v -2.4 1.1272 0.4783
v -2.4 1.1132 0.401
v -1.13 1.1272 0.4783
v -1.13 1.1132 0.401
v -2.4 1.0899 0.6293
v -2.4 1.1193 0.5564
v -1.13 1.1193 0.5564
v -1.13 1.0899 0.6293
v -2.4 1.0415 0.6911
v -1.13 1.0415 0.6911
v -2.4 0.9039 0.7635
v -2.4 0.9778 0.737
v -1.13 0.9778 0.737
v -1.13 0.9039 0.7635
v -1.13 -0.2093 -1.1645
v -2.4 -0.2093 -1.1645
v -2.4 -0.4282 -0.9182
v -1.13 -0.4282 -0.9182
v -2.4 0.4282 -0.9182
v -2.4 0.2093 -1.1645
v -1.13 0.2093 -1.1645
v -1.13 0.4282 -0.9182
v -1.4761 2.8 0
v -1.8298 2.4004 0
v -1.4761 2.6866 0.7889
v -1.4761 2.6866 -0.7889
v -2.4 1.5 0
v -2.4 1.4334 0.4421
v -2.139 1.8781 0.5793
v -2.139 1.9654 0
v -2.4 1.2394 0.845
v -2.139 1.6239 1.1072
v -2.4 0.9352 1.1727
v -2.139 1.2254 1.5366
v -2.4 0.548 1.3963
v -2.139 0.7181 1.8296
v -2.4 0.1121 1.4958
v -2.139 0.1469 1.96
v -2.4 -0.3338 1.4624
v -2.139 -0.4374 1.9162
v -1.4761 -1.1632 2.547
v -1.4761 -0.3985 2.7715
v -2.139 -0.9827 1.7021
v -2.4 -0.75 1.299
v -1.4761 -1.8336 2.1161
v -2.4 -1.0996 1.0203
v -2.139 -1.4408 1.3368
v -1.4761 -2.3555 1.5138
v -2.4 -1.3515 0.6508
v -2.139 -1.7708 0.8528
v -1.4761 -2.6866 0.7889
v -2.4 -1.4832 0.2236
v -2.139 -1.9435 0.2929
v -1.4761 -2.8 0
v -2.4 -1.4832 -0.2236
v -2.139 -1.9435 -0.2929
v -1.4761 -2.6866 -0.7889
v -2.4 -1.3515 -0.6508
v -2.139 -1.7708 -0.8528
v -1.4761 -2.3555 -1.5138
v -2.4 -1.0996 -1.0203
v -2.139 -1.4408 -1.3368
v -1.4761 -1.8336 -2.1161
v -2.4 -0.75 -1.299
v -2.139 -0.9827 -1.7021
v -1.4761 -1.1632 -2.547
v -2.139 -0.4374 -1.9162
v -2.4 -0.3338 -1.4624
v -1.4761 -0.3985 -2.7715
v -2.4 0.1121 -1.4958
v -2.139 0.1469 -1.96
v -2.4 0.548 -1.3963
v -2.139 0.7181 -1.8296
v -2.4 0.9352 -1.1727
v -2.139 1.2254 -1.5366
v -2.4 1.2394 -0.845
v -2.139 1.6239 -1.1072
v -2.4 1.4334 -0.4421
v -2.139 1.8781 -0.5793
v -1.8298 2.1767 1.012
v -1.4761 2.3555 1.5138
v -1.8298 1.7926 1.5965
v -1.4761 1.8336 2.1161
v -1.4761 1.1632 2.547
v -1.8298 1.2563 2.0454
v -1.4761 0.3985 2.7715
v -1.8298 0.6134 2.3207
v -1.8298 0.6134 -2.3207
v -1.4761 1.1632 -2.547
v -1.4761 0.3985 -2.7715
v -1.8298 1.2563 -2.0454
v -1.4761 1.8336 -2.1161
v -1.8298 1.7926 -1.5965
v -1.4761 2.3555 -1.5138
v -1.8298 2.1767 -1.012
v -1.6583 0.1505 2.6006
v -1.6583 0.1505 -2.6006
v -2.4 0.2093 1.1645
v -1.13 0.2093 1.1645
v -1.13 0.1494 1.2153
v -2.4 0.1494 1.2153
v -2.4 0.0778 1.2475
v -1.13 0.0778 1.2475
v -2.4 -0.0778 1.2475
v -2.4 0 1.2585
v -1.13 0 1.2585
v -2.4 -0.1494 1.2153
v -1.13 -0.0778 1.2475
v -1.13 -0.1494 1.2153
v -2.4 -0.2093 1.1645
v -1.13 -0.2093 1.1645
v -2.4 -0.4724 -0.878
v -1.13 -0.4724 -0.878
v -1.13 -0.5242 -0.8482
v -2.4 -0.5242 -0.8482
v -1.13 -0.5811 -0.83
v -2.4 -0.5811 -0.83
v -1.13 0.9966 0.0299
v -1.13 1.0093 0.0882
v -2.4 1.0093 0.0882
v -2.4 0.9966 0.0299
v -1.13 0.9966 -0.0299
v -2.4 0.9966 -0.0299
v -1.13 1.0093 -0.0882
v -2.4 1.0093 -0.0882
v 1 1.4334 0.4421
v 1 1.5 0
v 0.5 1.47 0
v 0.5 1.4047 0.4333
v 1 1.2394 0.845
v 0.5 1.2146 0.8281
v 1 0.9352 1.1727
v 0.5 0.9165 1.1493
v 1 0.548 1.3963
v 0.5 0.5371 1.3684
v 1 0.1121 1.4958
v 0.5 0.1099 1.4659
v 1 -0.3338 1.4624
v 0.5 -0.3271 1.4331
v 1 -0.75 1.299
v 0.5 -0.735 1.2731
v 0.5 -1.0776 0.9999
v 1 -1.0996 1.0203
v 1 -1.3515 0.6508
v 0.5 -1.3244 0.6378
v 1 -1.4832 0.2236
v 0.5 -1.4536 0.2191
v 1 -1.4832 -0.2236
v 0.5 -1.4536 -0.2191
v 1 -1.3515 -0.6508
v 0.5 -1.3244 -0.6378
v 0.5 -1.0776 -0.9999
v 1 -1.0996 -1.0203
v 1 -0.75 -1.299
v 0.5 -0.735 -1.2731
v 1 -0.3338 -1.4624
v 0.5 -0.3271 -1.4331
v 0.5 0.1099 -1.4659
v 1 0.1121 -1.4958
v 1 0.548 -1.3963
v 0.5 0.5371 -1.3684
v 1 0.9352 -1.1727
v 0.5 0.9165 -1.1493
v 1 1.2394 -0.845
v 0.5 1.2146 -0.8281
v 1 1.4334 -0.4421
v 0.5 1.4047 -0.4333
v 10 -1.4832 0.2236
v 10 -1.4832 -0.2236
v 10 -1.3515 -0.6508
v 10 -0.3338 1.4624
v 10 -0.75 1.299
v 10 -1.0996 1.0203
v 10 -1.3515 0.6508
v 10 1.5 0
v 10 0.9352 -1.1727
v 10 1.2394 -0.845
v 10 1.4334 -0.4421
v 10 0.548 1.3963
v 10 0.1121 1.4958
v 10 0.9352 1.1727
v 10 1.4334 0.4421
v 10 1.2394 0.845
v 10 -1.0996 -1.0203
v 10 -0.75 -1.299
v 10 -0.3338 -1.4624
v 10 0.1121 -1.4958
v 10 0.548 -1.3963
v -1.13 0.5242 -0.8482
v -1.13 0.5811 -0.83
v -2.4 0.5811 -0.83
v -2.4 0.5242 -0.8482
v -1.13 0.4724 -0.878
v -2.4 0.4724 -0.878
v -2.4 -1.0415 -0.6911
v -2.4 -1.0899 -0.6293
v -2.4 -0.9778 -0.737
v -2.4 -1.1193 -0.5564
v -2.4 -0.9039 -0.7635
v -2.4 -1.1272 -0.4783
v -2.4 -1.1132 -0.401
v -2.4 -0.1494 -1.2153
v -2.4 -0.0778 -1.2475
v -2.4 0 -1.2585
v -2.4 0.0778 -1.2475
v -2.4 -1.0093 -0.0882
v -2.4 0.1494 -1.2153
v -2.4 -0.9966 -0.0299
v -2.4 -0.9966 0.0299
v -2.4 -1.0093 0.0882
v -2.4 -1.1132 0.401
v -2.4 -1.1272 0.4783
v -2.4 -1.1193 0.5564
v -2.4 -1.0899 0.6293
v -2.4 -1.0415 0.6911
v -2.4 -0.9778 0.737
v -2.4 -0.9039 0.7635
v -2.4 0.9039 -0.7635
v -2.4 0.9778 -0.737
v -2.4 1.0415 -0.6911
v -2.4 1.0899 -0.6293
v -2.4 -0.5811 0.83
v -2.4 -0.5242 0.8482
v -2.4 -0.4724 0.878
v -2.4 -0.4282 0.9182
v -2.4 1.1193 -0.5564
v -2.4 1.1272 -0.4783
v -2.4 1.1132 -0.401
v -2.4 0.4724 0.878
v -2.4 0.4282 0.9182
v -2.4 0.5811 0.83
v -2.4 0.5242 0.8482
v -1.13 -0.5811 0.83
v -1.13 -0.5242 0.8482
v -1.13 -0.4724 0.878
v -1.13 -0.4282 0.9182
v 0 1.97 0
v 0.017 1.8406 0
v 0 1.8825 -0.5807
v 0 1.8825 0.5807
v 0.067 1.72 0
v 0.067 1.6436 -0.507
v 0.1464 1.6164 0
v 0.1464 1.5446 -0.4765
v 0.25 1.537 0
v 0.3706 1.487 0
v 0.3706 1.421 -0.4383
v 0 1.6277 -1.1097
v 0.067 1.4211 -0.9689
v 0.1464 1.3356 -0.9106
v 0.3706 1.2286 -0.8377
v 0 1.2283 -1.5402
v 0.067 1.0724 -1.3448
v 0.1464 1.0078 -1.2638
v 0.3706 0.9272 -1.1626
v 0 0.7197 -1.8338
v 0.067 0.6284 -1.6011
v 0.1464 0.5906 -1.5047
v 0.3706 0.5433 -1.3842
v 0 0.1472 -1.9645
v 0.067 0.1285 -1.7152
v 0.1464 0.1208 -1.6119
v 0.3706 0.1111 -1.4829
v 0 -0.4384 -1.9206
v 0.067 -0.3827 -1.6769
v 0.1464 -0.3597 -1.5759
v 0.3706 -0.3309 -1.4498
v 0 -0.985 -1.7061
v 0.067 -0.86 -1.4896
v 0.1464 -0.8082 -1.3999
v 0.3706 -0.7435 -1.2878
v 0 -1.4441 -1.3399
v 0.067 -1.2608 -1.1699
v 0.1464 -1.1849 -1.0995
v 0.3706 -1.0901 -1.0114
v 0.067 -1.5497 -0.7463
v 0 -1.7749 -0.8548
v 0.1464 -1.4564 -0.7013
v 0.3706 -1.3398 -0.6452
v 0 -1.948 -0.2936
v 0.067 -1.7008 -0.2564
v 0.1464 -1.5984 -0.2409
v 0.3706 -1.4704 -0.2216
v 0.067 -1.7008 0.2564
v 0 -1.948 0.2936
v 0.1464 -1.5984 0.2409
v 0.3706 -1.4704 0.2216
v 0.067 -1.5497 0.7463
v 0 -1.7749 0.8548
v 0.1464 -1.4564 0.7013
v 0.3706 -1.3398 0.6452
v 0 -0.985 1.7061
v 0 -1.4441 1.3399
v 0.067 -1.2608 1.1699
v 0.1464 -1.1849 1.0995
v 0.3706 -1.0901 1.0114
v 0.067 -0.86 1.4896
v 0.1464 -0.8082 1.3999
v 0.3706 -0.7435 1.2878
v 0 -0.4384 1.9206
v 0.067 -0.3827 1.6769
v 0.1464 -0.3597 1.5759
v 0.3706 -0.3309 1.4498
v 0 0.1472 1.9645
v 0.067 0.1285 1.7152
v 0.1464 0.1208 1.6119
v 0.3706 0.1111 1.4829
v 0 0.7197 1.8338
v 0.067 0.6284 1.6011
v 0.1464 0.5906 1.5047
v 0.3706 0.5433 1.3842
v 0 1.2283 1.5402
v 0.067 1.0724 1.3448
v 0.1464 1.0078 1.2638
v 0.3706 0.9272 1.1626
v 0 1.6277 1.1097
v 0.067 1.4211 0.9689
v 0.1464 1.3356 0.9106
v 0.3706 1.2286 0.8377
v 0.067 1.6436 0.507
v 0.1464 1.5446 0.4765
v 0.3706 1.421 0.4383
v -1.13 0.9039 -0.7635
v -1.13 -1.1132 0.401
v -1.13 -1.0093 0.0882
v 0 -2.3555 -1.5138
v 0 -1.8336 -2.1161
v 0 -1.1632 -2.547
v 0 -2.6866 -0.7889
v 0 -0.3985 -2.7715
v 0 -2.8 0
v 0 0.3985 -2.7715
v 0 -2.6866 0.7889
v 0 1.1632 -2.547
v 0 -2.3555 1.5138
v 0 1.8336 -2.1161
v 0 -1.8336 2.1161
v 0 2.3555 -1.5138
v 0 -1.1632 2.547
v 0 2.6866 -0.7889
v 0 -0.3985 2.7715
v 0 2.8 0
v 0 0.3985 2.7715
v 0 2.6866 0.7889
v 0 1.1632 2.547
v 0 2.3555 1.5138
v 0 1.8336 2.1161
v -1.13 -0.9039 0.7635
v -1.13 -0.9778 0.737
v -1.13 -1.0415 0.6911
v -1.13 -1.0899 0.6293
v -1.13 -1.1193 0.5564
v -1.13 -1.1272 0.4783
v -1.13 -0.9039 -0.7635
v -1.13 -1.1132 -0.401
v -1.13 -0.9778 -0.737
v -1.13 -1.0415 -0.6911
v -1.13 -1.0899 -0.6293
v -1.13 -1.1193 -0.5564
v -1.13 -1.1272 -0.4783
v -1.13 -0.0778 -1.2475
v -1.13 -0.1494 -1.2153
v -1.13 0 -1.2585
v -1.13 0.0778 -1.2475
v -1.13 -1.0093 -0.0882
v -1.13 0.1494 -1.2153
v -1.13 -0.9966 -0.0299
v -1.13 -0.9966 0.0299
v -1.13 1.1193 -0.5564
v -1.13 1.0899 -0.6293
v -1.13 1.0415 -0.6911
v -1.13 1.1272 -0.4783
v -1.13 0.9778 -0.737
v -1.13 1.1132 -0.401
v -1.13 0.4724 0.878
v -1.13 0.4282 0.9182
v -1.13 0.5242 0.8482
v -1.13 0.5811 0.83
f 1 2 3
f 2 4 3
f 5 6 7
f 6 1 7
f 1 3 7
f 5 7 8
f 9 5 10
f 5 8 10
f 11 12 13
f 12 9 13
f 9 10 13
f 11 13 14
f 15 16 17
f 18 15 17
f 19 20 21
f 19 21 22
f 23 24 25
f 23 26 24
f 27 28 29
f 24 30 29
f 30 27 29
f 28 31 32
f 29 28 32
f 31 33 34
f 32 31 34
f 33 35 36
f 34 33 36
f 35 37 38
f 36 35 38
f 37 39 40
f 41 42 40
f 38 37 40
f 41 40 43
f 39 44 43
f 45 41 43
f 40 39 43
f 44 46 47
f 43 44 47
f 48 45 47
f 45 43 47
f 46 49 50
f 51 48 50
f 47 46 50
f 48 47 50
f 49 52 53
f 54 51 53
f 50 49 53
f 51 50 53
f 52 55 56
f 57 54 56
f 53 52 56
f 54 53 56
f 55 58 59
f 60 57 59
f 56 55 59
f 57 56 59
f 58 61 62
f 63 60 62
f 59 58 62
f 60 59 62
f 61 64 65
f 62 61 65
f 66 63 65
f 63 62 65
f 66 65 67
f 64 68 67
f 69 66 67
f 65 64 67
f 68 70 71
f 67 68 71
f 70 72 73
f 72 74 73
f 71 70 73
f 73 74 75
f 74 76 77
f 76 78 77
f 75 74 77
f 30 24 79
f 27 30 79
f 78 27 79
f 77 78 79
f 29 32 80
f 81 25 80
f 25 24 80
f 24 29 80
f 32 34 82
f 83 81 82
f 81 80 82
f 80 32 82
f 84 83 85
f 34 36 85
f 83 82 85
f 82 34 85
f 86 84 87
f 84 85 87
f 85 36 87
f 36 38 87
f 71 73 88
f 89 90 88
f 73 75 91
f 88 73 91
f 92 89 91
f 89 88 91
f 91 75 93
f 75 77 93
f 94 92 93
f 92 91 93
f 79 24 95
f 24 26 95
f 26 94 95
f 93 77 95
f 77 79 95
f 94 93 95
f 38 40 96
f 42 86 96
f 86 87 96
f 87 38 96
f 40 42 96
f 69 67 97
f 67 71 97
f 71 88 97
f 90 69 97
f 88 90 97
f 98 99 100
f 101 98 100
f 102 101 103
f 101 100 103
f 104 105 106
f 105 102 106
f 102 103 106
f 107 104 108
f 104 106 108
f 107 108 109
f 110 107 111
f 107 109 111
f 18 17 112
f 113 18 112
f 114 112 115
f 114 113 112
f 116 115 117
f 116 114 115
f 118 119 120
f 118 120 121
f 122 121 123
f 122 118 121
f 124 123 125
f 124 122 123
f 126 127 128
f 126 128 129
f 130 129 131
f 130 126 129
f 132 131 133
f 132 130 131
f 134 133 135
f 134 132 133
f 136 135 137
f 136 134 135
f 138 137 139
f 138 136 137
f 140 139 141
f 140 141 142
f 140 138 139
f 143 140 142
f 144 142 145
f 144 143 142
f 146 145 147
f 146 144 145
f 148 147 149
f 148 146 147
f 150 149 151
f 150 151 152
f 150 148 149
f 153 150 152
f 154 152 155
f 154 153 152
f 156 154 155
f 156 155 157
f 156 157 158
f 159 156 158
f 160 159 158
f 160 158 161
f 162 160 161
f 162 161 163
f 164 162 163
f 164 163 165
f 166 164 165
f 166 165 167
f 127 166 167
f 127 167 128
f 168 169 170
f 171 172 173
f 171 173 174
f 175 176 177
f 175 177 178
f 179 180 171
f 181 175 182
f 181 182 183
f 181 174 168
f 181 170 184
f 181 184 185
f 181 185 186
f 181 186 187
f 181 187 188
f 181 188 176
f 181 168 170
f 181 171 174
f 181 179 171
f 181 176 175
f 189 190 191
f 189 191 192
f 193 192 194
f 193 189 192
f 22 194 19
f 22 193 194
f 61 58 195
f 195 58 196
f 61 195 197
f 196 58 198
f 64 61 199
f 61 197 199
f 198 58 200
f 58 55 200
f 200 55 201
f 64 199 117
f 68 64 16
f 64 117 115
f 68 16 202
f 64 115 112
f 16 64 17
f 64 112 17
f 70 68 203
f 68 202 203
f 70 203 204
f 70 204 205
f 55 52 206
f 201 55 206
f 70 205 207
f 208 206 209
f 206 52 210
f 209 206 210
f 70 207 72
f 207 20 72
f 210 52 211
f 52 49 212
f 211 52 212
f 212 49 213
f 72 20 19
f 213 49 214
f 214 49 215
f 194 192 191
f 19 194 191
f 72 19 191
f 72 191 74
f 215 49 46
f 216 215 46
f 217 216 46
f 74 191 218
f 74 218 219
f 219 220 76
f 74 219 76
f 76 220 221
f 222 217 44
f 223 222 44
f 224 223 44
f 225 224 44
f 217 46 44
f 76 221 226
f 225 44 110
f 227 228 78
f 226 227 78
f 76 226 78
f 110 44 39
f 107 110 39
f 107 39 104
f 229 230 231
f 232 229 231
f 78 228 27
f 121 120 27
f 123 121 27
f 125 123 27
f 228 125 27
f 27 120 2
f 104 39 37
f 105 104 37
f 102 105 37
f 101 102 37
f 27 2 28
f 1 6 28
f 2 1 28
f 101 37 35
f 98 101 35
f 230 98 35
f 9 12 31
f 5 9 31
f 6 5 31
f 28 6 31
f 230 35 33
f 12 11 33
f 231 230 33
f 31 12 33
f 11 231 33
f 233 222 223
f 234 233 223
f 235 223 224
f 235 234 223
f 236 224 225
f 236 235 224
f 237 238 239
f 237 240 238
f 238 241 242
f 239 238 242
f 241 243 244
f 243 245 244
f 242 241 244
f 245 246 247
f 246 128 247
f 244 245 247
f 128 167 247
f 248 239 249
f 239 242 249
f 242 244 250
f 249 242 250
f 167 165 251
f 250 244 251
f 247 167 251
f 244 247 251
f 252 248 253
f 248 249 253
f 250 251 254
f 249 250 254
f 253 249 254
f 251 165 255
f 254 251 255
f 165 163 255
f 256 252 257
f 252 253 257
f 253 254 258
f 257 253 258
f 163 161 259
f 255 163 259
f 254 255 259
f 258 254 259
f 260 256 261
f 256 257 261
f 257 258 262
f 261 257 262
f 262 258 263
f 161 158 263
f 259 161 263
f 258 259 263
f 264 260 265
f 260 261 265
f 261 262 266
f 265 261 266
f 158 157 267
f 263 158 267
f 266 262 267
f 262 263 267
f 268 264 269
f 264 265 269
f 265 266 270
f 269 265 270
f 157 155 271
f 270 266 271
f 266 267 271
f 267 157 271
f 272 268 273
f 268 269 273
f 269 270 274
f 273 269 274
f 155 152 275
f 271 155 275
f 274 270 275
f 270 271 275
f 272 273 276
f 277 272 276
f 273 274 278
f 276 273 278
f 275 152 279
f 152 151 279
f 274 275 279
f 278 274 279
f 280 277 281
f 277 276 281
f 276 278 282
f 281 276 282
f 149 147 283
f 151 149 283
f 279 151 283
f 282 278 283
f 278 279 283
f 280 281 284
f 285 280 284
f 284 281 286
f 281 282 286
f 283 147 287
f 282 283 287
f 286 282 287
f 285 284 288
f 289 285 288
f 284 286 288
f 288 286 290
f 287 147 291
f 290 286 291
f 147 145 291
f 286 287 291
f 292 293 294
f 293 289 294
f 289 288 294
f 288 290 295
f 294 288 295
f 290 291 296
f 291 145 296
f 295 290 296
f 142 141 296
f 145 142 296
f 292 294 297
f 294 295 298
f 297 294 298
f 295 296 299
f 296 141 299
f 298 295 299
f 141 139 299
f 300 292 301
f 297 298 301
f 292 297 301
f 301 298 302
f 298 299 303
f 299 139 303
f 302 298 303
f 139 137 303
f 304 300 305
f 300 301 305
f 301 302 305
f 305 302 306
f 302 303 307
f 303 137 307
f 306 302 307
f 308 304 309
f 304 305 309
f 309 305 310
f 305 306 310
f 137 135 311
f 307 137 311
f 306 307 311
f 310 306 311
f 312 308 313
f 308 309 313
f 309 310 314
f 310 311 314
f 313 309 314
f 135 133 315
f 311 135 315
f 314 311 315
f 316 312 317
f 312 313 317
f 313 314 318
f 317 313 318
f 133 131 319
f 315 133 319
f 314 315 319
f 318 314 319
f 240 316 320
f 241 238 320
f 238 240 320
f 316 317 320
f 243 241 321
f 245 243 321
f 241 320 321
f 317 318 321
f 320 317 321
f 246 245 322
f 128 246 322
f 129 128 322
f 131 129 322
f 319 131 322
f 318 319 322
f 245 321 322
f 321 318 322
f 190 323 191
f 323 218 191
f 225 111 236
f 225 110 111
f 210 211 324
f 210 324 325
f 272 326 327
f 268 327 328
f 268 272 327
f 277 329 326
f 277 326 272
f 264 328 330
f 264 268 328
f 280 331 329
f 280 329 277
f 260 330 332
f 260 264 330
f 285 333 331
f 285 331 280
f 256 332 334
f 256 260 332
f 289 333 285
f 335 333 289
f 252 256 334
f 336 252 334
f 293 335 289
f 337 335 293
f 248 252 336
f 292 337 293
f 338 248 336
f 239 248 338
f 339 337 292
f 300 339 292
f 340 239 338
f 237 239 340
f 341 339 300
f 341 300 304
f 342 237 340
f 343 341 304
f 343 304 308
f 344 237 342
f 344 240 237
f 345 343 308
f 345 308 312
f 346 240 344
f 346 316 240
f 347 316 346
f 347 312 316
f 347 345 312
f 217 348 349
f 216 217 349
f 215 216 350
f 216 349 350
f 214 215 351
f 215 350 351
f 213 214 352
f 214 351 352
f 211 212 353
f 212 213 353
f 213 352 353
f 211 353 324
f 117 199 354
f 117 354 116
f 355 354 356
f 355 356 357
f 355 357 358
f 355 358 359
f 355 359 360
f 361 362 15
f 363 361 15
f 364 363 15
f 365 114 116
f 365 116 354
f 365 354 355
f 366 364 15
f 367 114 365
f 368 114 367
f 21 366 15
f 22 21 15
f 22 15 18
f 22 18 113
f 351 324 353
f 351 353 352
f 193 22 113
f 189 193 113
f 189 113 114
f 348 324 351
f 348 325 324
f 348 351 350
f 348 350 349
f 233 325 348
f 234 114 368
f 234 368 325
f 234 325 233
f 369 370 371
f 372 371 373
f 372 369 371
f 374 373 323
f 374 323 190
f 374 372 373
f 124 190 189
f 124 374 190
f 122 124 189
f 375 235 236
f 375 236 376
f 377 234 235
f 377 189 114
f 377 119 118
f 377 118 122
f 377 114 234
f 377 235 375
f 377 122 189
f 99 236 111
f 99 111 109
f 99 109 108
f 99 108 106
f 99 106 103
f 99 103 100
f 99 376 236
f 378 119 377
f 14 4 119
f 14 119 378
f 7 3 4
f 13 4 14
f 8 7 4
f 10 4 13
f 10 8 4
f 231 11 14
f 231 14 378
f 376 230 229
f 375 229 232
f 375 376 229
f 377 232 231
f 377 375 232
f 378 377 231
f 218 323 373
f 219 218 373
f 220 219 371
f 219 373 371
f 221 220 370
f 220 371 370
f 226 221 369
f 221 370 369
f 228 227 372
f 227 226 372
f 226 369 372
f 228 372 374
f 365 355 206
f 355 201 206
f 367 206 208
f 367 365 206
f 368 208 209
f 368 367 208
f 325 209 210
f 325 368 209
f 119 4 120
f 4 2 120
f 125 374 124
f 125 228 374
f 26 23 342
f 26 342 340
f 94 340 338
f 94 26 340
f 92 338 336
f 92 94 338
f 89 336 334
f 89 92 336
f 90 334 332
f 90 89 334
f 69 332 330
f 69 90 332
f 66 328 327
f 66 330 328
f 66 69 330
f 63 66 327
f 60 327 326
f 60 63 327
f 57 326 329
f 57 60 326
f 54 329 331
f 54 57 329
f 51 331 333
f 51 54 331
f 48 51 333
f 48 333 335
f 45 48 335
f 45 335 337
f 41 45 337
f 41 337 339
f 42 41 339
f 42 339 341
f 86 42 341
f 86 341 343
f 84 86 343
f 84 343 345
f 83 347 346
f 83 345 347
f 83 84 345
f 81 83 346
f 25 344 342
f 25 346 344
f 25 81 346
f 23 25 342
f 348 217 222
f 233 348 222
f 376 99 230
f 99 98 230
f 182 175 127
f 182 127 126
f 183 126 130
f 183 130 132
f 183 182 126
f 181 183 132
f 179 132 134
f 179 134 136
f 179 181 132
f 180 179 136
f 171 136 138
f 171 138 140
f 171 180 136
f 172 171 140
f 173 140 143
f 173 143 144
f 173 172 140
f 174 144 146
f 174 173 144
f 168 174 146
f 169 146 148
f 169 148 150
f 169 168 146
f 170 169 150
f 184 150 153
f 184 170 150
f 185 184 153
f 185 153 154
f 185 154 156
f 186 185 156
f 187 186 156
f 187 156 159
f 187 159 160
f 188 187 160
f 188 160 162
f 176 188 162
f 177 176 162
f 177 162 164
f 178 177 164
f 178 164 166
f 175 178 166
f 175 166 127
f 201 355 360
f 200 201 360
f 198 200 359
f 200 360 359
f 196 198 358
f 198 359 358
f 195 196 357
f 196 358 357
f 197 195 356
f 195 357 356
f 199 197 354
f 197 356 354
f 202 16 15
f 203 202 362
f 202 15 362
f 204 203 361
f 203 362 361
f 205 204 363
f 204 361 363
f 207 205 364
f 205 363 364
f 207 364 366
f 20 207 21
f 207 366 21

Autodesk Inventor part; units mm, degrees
ref_plane "YZ Plane" through (0, 0, 0) normal (1, 0, 0) x (0, 1, 0)
ref_plane "XZ Plane" through (0, 0, 0) normal (0, 1, 0) x (-1, 0, 0)
ref_plane "XY Plane" through (0, 0, 0) normal (0, 0, 1) x (1, 0, 0)
sketch "Sketch4" plane through (0, 0, 0) normal (0, 0, 1) x (1, 0, 0)
  line L0 (-2.4, 0) -> (10, 0)
  line L1 (0, 0) -> (-2.4, 0)
  line L2 (0, 2.8) -> (0, 1.97)
  line L3 (0.5, 1.47) -> (0.5, 1.47)
  line L4 (0.5, 1.47) -> (1, 1.5)
  arc A0 (0, 1.97) -> (0.5, 1.47) centre (0.5, 1.97) ccw
  line L5 (-2.4, 0) -> (-2.4, 1.5)
  line L6 (0, 2.8) -> (-1.4761, 2.8)
  arc A1 (-1.4761, 2.8) -> (-2.4, 1.5) centre (2.0854, -0.7093) ccw
  line L7 (1, 1.5) -> (10, 1.5)
  line L8 (10, 1.5) -> (10, 0)
  point P0 (0, 1.47)
  dimension "d71" = 0.5
  dimension "d72" = 10
  dimension "d74" = 0.5
  dimension "d75" = 2.94
  dimension "d78" = 3
  dimension "d82" = 5
  dimension "d83" = 2.4
  dimension "d84" = 5.6
  dimension "d104" = 9
  dimension "d105" = 3
revolve "Revolution7" add sketch "Sketch4" angle 360 about axis through (-2.4, 0, 0) along (1, 0, 0)
sketch "Sketch5" plane through (-2.4, 0, 0) normal (-1, 0, 0) x (0, 0, 1)
  circle A0 centre (0, 0) radius 1.4 construction
  circle A1 centre (0, 0) radius 0.98 construction
  line L0 (0, 0) -> (-0.8487, 0.49)
  line L1 (0, 0) -> (-0.8487, -0.49)
  line L2 (-1.8008, 0) -> (1.7887, 0)
  line L3 (-1.4, 0) -> (-0.8487, -0.49)
  line L4 (-1.4, 0) -> (-0.8487, 0.49)
  point P0 (0, 0)
  dimension "d88" = 2.8
  dimension "d89" = 1.96
  dimension "d90" = 30
  dimension "d91" = 30
extrude "Extrusion1" cut sketch "Sketch5" against normal blind 1.27
pattern_circular "Circular Pattern1" count 6 over 360 about axis through (-10, 0, 0) along (1, 0, 0) of "Extrusion1"
fillet "Fillet1" radius 0.28 12 edges at (-1.765, -1.2124, -0.7) (-1.765, -0.49, -0.8487) (-1.765, -0.98, 0) (-1.765, -1.2124, 0.7) (-1.765, -0.49, 0.8487) (-1.765, 0, 1.4) (-1.765, 0.98, 0) (-1.765, 1.2124, 0.7) (-1.765, 0.49, 0.8487) (-1.765, 0.49, -0.8487) (-1.765, 0, -1.4) (-1.765, 1.2124, -0.7)
thread "Thread7" size "M3x0.5" class "6g" standard "ISO Metric profile" length 9
equation "\"a\" = 1"
equation "\"b\" = 9"
equation "\"dk\" = 5.6"
equation "\"k\" = 2.4"
equation "\"r\" = 0.5"
equation "\"rf\" = 5"
equation "\"x\" = 0.5"
equation "\"A_\" = 2.8"
equation "\"t\" = 1.27"
equation "\"p\" = 0.5"
equation "\"d\" = 3"
equation "\"ds_\" = 2.94"
equation "\"lg\" = 0"
properties part number "Винты со звездообразным углублением в плоско-выпуклой головке ISO 14583 — M3 x 10 — 4.8" material "Сталь"
